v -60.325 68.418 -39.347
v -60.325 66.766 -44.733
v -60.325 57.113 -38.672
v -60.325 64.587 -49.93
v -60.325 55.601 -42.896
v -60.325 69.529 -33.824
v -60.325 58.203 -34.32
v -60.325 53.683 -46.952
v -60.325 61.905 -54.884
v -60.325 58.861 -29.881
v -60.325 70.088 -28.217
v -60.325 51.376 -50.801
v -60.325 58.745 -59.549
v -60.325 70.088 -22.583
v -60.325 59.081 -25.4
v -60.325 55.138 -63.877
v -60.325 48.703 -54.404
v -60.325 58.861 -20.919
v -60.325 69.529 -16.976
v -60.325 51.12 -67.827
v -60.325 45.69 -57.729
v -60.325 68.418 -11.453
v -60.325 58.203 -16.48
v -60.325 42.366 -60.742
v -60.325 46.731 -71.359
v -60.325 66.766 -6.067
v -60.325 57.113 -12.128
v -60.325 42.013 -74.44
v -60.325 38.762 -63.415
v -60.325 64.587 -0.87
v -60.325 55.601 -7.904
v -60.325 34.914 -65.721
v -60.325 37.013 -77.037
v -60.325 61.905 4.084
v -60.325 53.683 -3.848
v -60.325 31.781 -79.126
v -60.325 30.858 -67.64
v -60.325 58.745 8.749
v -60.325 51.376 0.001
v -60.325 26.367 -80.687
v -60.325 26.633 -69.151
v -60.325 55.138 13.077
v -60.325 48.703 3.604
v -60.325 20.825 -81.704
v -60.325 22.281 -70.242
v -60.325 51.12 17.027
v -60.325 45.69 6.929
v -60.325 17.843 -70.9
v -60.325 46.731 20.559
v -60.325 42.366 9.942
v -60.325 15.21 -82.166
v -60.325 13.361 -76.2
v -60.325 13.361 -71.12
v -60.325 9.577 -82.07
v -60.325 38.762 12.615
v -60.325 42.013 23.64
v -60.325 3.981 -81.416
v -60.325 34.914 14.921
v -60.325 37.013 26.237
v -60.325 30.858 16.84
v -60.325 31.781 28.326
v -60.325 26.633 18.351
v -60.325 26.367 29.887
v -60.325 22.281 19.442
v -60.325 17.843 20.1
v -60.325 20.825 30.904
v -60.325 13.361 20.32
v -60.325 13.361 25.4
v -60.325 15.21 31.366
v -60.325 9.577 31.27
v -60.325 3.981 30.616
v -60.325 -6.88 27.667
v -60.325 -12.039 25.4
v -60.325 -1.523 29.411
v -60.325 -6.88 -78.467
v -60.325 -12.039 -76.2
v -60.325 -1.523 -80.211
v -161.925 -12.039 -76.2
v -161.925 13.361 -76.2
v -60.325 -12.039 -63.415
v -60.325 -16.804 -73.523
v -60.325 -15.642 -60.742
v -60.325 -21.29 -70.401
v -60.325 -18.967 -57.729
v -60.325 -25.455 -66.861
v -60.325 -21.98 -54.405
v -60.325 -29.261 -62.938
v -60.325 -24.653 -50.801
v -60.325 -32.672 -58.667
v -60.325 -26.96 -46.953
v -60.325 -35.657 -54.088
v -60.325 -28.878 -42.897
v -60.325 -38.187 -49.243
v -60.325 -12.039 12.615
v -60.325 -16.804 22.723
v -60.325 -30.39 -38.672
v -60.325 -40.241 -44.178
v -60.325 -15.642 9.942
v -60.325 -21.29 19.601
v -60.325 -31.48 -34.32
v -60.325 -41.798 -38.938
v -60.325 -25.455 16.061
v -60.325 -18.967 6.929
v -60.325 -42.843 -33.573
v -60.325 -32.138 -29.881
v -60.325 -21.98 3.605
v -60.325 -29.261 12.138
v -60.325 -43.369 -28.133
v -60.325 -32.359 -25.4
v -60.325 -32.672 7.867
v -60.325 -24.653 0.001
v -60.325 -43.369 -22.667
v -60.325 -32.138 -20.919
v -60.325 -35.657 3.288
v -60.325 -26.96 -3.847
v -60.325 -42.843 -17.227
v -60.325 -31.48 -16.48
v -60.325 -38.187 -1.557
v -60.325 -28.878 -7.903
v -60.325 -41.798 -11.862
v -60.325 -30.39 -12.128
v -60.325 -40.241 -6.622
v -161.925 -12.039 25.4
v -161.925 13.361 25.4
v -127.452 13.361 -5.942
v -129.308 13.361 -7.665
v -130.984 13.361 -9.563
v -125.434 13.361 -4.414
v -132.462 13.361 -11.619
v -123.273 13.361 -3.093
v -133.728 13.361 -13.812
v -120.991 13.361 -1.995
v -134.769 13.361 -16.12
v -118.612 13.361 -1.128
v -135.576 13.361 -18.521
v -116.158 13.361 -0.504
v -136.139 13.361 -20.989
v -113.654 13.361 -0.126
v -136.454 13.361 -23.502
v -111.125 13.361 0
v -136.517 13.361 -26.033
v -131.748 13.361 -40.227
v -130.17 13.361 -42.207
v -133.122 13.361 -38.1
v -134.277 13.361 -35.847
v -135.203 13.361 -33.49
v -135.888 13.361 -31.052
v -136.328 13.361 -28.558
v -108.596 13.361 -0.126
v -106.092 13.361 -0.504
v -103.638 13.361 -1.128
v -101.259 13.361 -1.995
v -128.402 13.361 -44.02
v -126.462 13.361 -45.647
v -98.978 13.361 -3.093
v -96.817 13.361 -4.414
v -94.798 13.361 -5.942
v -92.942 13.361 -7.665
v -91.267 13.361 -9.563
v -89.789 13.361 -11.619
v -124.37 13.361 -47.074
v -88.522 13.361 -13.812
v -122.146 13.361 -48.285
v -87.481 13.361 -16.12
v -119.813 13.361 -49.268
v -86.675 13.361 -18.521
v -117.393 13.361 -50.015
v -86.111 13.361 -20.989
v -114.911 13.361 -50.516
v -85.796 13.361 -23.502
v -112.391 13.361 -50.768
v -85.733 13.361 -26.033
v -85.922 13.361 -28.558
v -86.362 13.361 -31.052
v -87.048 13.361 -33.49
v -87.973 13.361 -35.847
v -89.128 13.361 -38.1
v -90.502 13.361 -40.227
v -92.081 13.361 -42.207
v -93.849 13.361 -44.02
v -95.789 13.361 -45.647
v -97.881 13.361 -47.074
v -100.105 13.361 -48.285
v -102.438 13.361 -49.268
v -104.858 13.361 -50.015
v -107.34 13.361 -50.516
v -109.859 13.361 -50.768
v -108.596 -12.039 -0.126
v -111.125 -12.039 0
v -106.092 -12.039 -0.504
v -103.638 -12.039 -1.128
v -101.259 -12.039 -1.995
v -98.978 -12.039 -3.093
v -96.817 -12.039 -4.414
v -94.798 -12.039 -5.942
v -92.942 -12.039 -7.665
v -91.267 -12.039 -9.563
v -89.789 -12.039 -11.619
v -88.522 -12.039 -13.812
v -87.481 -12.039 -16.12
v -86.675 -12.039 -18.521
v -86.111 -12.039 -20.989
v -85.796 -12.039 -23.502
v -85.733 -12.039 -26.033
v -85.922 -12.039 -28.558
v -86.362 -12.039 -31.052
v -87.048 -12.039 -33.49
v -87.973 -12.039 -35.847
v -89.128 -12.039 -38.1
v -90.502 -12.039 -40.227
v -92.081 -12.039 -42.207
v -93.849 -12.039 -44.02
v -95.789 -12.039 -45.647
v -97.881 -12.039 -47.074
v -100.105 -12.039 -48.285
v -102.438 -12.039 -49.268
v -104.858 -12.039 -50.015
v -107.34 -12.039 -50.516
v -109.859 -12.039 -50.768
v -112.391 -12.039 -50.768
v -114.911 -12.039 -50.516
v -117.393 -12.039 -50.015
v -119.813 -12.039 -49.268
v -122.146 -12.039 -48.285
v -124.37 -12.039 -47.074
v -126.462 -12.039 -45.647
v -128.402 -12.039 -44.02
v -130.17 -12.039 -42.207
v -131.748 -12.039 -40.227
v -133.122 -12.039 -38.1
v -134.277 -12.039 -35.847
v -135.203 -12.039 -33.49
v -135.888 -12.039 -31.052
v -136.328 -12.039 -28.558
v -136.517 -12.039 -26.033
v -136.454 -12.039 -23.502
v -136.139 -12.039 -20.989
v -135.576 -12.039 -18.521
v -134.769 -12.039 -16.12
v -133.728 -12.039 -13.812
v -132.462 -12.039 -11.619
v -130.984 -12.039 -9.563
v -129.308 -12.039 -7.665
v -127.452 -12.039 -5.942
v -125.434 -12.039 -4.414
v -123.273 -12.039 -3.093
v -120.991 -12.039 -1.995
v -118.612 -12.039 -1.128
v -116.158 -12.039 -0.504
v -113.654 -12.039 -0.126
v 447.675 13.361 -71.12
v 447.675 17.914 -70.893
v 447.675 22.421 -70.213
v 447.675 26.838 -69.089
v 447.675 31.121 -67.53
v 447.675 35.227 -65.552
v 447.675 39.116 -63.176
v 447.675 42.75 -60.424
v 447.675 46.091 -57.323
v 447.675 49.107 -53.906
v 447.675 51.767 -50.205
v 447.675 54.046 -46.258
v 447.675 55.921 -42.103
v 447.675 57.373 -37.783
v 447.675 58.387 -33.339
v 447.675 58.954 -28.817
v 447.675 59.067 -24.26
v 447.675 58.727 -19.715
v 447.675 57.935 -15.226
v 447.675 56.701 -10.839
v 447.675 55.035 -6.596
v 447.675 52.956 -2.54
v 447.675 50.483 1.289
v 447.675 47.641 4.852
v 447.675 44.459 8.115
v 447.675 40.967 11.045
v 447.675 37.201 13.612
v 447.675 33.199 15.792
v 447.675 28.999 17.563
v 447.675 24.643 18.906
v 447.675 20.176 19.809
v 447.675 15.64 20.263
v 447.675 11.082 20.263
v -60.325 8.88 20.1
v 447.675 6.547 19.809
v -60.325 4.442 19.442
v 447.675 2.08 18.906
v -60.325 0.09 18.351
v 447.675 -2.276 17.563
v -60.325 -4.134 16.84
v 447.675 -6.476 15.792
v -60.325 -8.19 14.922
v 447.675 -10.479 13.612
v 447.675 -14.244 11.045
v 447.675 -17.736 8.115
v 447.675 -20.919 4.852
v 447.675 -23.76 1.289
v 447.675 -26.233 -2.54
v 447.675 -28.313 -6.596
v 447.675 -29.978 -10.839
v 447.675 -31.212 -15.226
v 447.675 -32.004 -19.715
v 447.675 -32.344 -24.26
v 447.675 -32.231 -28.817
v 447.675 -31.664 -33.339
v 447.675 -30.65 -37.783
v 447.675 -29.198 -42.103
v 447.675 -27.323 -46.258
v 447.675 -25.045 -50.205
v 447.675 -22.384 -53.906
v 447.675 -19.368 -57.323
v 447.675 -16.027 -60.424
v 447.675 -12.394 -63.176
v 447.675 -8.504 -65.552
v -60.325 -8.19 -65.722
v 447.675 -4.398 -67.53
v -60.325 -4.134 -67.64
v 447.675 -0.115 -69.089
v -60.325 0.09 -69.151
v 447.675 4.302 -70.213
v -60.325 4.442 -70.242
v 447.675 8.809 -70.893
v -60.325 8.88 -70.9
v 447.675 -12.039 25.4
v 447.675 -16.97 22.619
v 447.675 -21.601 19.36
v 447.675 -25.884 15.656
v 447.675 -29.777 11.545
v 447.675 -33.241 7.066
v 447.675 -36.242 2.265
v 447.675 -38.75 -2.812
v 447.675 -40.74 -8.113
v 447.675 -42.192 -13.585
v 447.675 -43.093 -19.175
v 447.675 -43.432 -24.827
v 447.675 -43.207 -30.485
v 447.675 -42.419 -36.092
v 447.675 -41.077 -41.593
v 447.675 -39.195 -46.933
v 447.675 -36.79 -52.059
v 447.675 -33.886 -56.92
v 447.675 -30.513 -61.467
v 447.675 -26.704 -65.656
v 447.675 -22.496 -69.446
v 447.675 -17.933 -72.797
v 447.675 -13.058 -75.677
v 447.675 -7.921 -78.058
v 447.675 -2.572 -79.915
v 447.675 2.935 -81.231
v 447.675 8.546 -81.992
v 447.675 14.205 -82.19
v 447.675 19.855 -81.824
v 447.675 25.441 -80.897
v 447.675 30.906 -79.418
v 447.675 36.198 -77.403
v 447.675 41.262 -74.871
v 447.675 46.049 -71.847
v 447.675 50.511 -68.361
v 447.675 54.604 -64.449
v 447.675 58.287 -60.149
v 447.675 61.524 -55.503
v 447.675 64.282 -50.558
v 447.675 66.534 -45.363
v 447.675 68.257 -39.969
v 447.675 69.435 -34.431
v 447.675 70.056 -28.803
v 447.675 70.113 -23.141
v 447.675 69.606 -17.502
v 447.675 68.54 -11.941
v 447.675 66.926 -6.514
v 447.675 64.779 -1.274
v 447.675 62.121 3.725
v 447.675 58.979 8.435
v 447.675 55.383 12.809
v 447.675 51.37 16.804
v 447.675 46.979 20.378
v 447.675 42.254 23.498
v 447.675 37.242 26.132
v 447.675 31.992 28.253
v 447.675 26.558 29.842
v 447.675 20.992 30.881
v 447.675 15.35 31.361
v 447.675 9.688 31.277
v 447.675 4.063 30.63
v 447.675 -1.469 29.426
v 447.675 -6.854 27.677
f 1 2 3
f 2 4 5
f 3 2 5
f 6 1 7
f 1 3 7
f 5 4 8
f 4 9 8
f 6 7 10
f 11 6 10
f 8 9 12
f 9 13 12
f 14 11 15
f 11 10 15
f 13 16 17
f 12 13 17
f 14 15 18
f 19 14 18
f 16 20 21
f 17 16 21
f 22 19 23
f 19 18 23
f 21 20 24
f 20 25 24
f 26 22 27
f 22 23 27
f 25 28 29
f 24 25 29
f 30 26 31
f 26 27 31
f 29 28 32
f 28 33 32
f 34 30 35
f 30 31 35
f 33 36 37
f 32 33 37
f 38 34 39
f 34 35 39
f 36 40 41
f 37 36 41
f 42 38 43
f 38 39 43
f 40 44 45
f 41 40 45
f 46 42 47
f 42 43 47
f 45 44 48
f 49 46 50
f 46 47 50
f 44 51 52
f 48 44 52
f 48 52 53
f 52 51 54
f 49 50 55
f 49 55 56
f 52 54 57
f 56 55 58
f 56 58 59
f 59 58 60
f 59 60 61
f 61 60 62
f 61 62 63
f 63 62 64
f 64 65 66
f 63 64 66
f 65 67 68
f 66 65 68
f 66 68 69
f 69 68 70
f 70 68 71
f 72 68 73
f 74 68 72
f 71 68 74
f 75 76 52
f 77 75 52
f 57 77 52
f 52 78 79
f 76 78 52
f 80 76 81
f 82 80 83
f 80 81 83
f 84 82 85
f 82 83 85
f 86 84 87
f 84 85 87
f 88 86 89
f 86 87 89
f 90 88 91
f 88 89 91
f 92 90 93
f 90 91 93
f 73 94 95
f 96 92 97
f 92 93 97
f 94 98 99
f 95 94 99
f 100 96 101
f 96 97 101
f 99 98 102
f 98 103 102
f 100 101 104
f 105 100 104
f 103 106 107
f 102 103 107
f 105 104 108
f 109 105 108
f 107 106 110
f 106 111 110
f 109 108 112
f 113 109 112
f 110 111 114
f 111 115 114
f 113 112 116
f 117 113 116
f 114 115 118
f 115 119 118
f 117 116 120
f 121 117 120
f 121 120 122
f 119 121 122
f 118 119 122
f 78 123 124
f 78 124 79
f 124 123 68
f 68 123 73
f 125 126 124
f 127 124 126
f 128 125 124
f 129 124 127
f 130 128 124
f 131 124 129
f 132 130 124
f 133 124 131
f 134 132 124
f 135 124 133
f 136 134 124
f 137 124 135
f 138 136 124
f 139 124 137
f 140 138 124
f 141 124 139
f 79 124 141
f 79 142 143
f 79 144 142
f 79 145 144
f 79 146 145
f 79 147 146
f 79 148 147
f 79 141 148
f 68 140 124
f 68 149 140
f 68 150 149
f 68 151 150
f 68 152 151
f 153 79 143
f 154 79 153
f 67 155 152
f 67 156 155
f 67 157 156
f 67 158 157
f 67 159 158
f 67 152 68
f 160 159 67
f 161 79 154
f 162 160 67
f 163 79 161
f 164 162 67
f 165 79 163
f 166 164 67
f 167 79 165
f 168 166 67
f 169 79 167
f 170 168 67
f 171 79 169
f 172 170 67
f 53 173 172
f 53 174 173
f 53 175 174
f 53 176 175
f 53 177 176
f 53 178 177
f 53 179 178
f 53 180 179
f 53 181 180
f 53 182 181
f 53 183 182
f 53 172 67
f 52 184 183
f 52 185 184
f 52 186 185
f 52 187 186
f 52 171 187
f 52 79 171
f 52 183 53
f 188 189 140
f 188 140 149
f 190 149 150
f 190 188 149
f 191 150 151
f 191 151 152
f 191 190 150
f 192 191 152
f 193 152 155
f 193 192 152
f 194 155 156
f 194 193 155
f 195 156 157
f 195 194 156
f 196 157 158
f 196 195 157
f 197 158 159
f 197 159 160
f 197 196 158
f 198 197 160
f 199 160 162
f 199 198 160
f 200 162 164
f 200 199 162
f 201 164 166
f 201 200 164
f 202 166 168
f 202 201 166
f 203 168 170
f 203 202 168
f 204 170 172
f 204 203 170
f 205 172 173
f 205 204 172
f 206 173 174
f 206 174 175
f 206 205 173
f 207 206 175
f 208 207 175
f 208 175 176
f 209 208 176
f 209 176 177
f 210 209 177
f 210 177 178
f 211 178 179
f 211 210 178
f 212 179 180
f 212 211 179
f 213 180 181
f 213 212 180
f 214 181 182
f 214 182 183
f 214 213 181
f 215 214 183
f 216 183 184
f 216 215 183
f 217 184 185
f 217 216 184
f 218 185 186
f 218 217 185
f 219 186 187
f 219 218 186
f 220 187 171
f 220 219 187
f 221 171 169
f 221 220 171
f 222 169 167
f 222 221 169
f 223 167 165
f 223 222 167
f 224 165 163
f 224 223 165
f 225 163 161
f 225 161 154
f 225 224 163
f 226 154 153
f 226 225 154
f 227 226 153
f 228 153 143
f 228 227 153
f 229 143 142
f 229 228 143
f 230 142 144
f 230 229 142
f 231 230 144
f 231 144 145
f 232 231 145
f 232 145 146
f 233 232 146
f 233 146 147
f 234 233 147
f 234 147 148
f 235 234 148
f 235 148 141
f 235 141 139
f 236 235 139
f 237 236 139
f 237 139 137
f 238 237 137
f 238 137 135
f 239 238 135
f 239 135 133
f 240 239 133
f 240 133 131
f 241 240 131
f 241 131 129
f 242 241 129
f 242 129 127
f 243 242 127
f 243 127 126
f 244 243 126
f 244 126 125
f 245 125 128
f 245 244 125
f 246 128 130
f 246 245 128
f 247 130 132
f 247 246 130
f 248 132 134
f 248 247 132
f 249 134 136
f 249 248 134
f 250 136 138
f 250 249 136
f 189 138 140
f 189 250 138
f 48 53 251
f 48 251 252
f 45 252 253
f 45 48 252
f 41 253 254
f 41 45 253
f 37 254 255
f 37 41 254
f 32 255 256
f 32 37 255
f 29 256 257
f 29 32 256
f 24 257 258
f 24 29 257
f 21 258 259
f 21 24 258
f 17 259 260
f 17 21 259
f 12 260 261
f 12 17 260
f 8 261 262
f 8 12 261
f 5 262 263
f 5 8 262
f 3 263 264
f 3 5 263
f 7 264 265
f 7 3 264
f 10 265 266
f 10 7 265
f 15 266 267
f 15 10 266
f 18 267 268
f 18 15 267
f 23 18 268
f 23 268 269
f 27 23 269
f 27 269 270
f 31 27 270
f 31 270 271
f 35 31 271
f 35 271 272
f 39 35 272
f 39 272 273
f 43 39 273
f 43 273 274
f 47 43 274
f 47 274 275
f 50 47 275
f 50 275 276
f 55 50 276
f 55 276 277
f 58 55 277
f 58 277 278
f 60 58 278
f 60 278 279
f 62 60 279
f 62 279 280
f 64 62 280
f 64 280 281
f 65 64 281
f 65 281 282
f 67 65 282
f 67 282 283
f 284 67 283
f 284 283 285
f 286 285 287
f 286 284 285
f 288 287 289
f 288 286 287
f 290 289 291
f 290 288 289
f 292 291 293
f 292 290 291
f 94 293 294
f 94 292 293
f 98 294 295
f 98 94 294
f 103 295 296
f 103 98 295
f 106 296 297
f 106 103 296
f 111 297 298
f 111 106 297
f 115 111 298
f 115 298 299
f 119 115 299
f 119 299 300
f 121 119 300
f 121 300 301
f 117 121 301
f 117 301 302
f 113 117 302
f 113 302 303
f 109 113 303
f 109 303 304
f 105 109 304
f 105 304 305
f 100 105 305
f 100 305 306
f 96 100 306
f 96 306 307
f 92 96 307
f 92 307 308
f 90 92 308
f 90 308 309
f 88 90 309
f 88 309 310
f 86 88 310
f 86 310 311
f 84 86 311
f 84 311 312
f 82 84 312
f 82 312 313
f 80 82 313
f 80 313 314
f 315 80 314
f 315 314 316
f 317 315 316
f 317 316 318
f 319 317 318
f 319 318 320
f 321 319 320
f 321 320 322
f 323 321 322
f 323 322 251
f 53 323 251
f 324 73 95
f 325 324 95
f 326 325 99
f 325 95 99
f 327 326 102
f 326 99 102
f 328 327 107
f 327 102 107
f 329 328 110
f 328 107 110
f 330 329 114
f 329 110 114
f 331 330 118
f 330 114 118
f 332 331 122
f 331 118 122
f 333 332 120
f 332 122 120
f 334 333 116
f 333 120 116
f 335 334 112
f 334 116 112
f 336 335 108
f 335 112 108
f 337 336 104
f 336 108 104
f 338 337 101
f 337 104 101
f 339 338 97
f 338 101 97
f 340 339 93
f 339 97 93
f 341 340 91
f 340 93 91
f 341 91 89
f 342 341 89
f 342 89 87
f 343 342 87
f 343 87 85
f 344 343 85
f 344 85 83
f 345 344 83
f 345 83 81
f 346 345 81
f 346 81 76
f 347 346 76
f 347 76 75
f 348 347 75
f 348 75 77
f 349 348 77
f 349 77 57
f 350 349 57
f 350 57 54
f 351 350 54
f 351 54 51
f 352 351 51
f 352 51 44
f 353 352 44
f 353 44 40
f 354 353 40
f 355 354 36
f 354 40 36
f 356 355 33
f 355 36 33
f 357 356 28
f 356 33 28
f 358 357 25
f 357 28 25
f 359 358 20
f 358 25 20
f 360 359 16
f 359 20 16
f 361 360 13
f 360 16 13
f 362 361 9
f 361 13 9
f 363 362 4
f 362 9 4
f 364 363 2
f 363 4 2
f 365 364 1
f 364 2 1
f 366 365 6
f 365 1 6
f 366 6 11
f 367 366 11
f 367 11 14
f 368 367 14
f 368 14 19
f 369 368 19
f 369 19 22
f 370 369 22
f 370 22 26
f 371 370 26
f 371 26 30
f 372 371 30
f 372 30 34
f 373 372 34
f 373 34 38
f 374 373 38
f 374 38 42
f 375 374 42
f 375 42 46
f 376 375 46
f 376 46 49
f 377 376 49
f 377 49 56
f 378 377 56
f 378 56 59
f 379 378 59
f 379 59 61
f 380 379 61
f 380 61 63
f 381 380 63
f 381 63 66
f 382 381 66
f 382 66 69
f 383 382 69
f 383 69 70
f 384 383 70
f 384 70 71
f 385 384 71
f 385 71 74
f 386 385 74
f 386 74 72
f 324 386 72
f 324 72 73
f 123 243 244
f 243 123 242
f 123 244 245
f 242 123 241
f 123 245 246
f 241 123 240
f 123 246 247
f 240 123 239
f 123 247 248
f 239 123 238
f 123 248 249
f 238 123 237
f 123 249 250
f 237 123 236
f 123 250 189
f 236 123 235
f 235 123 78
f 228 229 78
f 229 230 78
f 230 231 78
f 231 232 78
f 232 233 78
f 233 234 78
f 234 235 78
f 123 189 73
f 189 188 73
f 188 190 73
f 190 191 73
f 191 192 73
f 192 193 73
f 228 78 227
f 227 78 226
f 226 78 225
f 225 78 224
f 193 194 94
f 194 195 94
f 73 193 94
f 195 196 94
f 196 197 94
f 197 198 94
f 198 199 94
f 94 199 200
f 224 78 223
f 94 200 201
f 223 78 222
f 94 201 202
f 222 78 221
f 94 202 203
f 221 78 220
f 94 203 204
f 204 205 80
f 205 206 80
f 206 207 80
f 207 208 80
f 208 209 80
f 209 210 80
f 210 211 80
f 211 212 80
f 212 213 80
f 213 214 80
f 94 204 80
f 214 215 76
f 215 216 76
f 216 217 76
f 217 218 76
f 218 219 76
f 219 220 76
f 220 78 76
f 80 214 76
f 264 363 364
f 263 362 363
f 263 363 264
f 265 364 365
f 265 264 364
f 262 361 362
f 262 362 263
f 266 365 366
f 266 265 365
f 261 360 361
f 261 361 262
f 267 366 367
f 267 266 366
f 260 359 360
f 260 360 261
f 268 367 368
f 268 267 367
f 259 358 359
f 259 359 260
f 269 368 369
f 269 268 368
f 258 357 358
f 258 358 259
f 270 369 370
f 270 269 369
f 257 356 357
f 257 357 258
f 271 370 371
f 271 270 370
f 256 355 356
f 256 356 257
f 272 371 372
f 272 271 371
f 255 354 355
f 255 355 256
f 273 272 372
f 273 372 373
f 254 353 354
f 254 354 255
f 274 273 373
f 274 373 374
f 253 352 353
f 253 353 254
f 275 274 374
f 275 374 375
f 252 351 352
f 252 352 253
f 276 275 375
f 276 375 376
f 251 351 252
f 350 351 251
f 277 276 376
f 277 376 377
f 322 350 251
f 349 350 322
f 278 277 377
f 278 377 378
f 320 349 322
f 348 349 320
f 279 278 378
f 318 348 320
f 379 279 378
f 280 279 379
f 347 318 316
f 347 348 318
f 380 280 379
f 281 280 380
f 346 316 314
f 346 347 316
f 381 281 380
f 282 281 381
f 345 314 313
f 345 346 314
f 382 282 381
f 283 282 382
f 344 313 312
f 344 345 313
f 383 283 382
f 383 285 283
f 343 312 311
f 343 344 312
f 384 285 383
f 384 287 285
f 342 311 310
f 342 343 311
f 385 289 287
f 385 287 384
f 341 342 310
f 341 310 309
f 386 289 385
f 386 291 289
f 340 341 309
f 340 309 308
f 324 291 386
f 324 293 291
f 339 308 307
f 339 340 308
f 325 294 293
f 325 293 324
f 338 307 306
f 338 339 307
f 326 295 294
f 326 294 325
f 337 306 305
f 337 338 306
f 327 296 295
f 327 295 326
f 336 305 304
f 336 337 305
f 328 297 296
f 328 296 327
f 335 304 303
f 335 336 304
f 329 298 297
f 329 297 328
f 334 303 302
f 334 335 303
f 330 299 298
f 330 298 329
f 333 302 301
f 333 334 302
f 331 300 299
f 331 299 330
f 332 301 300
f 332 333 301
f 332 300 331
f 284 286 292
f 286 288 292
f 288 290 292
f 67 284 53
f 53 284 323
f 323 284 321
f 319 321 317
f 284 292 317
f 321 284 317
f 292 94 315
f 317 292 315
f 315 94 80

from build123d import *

# Parameters (mm, degrees)
SKETCH1_W           = 50.8
SKETCH1_H           = 50.8
SKETCH1_R           = 12.7
BOSS_EXTRUDE1_DEPTH = 12.7
SKETCH2_R           = 28.398063314
SKETCH2_R_2         = 22.86
BOSS_EXTRUDE2_DEPTH = 254
SCALE1_SCALE        = 3
SCALE2_SCALE        = 0.333333333
SCALE3_SCALE        = 2


with BuildPart() as part:
    # Sketch1 → Boss-Extrude1 (new body)
    with BuildSketch(Plane(origin=(0, 0, 0), x_dir=(1, 0, 0), z_dir=(0, 1, 0))):
        with Locations((25.4, 25.4)):
            Rectangle(SKETCH1_W, SKETCH1_H)
        with Locations(Location((25.4, 25.4, 0), (0, 0, 270))):
            Circle(SKETCH1_R, mode=Mode.SUBTRACT)
    extrude(amount=BOSS_EXTRUDE1_DEPTH)

    # Sketch2 → Boss-Extrude2 (add)
    with BuildSketch(Plane(origin=(50.8, 0, 0), x_dir=(0, 0, -1), z_dir=(1, 0, 0))):
        with Locations(Location((25.4, 12.7, 0), (0, 0, 206.565051177))):
            Circle(SKETCH2_R)
        with Locations((25.4, 12.7)):
            Circle(SKETCH2_R_2, mode=Mode.SUBTRACT)
    extrude(amount=BOSS_EXTRUDE2_DEPTH)


with BuildPart() as part_1:
    # Scale1: scaled about (161.925226112, 12.038551088, -25.4)
    add(part.part.scale(SCALE1_SCALE).moved(Location((-323.850452224, -24.077102176, 50.8))))


with BuildPart() as part_2:
    # Scale2: scaled about (161.925226113, 12.038551088, -25.4)
    add(part_1.part.scale(SCALE2_SCALE).moved(Location((107.950150742, 8.025700725, -16.933333333))))


with BuildPart() as part_3:
    # Scale3: scaled about (161.925226113, 12.038551088, -25.4)
    add(part_2.part.scale(SCALE3_SCALE).moved(Location((-161.925226113, -12.038551088, 25.4))))


solid = part_3.part
